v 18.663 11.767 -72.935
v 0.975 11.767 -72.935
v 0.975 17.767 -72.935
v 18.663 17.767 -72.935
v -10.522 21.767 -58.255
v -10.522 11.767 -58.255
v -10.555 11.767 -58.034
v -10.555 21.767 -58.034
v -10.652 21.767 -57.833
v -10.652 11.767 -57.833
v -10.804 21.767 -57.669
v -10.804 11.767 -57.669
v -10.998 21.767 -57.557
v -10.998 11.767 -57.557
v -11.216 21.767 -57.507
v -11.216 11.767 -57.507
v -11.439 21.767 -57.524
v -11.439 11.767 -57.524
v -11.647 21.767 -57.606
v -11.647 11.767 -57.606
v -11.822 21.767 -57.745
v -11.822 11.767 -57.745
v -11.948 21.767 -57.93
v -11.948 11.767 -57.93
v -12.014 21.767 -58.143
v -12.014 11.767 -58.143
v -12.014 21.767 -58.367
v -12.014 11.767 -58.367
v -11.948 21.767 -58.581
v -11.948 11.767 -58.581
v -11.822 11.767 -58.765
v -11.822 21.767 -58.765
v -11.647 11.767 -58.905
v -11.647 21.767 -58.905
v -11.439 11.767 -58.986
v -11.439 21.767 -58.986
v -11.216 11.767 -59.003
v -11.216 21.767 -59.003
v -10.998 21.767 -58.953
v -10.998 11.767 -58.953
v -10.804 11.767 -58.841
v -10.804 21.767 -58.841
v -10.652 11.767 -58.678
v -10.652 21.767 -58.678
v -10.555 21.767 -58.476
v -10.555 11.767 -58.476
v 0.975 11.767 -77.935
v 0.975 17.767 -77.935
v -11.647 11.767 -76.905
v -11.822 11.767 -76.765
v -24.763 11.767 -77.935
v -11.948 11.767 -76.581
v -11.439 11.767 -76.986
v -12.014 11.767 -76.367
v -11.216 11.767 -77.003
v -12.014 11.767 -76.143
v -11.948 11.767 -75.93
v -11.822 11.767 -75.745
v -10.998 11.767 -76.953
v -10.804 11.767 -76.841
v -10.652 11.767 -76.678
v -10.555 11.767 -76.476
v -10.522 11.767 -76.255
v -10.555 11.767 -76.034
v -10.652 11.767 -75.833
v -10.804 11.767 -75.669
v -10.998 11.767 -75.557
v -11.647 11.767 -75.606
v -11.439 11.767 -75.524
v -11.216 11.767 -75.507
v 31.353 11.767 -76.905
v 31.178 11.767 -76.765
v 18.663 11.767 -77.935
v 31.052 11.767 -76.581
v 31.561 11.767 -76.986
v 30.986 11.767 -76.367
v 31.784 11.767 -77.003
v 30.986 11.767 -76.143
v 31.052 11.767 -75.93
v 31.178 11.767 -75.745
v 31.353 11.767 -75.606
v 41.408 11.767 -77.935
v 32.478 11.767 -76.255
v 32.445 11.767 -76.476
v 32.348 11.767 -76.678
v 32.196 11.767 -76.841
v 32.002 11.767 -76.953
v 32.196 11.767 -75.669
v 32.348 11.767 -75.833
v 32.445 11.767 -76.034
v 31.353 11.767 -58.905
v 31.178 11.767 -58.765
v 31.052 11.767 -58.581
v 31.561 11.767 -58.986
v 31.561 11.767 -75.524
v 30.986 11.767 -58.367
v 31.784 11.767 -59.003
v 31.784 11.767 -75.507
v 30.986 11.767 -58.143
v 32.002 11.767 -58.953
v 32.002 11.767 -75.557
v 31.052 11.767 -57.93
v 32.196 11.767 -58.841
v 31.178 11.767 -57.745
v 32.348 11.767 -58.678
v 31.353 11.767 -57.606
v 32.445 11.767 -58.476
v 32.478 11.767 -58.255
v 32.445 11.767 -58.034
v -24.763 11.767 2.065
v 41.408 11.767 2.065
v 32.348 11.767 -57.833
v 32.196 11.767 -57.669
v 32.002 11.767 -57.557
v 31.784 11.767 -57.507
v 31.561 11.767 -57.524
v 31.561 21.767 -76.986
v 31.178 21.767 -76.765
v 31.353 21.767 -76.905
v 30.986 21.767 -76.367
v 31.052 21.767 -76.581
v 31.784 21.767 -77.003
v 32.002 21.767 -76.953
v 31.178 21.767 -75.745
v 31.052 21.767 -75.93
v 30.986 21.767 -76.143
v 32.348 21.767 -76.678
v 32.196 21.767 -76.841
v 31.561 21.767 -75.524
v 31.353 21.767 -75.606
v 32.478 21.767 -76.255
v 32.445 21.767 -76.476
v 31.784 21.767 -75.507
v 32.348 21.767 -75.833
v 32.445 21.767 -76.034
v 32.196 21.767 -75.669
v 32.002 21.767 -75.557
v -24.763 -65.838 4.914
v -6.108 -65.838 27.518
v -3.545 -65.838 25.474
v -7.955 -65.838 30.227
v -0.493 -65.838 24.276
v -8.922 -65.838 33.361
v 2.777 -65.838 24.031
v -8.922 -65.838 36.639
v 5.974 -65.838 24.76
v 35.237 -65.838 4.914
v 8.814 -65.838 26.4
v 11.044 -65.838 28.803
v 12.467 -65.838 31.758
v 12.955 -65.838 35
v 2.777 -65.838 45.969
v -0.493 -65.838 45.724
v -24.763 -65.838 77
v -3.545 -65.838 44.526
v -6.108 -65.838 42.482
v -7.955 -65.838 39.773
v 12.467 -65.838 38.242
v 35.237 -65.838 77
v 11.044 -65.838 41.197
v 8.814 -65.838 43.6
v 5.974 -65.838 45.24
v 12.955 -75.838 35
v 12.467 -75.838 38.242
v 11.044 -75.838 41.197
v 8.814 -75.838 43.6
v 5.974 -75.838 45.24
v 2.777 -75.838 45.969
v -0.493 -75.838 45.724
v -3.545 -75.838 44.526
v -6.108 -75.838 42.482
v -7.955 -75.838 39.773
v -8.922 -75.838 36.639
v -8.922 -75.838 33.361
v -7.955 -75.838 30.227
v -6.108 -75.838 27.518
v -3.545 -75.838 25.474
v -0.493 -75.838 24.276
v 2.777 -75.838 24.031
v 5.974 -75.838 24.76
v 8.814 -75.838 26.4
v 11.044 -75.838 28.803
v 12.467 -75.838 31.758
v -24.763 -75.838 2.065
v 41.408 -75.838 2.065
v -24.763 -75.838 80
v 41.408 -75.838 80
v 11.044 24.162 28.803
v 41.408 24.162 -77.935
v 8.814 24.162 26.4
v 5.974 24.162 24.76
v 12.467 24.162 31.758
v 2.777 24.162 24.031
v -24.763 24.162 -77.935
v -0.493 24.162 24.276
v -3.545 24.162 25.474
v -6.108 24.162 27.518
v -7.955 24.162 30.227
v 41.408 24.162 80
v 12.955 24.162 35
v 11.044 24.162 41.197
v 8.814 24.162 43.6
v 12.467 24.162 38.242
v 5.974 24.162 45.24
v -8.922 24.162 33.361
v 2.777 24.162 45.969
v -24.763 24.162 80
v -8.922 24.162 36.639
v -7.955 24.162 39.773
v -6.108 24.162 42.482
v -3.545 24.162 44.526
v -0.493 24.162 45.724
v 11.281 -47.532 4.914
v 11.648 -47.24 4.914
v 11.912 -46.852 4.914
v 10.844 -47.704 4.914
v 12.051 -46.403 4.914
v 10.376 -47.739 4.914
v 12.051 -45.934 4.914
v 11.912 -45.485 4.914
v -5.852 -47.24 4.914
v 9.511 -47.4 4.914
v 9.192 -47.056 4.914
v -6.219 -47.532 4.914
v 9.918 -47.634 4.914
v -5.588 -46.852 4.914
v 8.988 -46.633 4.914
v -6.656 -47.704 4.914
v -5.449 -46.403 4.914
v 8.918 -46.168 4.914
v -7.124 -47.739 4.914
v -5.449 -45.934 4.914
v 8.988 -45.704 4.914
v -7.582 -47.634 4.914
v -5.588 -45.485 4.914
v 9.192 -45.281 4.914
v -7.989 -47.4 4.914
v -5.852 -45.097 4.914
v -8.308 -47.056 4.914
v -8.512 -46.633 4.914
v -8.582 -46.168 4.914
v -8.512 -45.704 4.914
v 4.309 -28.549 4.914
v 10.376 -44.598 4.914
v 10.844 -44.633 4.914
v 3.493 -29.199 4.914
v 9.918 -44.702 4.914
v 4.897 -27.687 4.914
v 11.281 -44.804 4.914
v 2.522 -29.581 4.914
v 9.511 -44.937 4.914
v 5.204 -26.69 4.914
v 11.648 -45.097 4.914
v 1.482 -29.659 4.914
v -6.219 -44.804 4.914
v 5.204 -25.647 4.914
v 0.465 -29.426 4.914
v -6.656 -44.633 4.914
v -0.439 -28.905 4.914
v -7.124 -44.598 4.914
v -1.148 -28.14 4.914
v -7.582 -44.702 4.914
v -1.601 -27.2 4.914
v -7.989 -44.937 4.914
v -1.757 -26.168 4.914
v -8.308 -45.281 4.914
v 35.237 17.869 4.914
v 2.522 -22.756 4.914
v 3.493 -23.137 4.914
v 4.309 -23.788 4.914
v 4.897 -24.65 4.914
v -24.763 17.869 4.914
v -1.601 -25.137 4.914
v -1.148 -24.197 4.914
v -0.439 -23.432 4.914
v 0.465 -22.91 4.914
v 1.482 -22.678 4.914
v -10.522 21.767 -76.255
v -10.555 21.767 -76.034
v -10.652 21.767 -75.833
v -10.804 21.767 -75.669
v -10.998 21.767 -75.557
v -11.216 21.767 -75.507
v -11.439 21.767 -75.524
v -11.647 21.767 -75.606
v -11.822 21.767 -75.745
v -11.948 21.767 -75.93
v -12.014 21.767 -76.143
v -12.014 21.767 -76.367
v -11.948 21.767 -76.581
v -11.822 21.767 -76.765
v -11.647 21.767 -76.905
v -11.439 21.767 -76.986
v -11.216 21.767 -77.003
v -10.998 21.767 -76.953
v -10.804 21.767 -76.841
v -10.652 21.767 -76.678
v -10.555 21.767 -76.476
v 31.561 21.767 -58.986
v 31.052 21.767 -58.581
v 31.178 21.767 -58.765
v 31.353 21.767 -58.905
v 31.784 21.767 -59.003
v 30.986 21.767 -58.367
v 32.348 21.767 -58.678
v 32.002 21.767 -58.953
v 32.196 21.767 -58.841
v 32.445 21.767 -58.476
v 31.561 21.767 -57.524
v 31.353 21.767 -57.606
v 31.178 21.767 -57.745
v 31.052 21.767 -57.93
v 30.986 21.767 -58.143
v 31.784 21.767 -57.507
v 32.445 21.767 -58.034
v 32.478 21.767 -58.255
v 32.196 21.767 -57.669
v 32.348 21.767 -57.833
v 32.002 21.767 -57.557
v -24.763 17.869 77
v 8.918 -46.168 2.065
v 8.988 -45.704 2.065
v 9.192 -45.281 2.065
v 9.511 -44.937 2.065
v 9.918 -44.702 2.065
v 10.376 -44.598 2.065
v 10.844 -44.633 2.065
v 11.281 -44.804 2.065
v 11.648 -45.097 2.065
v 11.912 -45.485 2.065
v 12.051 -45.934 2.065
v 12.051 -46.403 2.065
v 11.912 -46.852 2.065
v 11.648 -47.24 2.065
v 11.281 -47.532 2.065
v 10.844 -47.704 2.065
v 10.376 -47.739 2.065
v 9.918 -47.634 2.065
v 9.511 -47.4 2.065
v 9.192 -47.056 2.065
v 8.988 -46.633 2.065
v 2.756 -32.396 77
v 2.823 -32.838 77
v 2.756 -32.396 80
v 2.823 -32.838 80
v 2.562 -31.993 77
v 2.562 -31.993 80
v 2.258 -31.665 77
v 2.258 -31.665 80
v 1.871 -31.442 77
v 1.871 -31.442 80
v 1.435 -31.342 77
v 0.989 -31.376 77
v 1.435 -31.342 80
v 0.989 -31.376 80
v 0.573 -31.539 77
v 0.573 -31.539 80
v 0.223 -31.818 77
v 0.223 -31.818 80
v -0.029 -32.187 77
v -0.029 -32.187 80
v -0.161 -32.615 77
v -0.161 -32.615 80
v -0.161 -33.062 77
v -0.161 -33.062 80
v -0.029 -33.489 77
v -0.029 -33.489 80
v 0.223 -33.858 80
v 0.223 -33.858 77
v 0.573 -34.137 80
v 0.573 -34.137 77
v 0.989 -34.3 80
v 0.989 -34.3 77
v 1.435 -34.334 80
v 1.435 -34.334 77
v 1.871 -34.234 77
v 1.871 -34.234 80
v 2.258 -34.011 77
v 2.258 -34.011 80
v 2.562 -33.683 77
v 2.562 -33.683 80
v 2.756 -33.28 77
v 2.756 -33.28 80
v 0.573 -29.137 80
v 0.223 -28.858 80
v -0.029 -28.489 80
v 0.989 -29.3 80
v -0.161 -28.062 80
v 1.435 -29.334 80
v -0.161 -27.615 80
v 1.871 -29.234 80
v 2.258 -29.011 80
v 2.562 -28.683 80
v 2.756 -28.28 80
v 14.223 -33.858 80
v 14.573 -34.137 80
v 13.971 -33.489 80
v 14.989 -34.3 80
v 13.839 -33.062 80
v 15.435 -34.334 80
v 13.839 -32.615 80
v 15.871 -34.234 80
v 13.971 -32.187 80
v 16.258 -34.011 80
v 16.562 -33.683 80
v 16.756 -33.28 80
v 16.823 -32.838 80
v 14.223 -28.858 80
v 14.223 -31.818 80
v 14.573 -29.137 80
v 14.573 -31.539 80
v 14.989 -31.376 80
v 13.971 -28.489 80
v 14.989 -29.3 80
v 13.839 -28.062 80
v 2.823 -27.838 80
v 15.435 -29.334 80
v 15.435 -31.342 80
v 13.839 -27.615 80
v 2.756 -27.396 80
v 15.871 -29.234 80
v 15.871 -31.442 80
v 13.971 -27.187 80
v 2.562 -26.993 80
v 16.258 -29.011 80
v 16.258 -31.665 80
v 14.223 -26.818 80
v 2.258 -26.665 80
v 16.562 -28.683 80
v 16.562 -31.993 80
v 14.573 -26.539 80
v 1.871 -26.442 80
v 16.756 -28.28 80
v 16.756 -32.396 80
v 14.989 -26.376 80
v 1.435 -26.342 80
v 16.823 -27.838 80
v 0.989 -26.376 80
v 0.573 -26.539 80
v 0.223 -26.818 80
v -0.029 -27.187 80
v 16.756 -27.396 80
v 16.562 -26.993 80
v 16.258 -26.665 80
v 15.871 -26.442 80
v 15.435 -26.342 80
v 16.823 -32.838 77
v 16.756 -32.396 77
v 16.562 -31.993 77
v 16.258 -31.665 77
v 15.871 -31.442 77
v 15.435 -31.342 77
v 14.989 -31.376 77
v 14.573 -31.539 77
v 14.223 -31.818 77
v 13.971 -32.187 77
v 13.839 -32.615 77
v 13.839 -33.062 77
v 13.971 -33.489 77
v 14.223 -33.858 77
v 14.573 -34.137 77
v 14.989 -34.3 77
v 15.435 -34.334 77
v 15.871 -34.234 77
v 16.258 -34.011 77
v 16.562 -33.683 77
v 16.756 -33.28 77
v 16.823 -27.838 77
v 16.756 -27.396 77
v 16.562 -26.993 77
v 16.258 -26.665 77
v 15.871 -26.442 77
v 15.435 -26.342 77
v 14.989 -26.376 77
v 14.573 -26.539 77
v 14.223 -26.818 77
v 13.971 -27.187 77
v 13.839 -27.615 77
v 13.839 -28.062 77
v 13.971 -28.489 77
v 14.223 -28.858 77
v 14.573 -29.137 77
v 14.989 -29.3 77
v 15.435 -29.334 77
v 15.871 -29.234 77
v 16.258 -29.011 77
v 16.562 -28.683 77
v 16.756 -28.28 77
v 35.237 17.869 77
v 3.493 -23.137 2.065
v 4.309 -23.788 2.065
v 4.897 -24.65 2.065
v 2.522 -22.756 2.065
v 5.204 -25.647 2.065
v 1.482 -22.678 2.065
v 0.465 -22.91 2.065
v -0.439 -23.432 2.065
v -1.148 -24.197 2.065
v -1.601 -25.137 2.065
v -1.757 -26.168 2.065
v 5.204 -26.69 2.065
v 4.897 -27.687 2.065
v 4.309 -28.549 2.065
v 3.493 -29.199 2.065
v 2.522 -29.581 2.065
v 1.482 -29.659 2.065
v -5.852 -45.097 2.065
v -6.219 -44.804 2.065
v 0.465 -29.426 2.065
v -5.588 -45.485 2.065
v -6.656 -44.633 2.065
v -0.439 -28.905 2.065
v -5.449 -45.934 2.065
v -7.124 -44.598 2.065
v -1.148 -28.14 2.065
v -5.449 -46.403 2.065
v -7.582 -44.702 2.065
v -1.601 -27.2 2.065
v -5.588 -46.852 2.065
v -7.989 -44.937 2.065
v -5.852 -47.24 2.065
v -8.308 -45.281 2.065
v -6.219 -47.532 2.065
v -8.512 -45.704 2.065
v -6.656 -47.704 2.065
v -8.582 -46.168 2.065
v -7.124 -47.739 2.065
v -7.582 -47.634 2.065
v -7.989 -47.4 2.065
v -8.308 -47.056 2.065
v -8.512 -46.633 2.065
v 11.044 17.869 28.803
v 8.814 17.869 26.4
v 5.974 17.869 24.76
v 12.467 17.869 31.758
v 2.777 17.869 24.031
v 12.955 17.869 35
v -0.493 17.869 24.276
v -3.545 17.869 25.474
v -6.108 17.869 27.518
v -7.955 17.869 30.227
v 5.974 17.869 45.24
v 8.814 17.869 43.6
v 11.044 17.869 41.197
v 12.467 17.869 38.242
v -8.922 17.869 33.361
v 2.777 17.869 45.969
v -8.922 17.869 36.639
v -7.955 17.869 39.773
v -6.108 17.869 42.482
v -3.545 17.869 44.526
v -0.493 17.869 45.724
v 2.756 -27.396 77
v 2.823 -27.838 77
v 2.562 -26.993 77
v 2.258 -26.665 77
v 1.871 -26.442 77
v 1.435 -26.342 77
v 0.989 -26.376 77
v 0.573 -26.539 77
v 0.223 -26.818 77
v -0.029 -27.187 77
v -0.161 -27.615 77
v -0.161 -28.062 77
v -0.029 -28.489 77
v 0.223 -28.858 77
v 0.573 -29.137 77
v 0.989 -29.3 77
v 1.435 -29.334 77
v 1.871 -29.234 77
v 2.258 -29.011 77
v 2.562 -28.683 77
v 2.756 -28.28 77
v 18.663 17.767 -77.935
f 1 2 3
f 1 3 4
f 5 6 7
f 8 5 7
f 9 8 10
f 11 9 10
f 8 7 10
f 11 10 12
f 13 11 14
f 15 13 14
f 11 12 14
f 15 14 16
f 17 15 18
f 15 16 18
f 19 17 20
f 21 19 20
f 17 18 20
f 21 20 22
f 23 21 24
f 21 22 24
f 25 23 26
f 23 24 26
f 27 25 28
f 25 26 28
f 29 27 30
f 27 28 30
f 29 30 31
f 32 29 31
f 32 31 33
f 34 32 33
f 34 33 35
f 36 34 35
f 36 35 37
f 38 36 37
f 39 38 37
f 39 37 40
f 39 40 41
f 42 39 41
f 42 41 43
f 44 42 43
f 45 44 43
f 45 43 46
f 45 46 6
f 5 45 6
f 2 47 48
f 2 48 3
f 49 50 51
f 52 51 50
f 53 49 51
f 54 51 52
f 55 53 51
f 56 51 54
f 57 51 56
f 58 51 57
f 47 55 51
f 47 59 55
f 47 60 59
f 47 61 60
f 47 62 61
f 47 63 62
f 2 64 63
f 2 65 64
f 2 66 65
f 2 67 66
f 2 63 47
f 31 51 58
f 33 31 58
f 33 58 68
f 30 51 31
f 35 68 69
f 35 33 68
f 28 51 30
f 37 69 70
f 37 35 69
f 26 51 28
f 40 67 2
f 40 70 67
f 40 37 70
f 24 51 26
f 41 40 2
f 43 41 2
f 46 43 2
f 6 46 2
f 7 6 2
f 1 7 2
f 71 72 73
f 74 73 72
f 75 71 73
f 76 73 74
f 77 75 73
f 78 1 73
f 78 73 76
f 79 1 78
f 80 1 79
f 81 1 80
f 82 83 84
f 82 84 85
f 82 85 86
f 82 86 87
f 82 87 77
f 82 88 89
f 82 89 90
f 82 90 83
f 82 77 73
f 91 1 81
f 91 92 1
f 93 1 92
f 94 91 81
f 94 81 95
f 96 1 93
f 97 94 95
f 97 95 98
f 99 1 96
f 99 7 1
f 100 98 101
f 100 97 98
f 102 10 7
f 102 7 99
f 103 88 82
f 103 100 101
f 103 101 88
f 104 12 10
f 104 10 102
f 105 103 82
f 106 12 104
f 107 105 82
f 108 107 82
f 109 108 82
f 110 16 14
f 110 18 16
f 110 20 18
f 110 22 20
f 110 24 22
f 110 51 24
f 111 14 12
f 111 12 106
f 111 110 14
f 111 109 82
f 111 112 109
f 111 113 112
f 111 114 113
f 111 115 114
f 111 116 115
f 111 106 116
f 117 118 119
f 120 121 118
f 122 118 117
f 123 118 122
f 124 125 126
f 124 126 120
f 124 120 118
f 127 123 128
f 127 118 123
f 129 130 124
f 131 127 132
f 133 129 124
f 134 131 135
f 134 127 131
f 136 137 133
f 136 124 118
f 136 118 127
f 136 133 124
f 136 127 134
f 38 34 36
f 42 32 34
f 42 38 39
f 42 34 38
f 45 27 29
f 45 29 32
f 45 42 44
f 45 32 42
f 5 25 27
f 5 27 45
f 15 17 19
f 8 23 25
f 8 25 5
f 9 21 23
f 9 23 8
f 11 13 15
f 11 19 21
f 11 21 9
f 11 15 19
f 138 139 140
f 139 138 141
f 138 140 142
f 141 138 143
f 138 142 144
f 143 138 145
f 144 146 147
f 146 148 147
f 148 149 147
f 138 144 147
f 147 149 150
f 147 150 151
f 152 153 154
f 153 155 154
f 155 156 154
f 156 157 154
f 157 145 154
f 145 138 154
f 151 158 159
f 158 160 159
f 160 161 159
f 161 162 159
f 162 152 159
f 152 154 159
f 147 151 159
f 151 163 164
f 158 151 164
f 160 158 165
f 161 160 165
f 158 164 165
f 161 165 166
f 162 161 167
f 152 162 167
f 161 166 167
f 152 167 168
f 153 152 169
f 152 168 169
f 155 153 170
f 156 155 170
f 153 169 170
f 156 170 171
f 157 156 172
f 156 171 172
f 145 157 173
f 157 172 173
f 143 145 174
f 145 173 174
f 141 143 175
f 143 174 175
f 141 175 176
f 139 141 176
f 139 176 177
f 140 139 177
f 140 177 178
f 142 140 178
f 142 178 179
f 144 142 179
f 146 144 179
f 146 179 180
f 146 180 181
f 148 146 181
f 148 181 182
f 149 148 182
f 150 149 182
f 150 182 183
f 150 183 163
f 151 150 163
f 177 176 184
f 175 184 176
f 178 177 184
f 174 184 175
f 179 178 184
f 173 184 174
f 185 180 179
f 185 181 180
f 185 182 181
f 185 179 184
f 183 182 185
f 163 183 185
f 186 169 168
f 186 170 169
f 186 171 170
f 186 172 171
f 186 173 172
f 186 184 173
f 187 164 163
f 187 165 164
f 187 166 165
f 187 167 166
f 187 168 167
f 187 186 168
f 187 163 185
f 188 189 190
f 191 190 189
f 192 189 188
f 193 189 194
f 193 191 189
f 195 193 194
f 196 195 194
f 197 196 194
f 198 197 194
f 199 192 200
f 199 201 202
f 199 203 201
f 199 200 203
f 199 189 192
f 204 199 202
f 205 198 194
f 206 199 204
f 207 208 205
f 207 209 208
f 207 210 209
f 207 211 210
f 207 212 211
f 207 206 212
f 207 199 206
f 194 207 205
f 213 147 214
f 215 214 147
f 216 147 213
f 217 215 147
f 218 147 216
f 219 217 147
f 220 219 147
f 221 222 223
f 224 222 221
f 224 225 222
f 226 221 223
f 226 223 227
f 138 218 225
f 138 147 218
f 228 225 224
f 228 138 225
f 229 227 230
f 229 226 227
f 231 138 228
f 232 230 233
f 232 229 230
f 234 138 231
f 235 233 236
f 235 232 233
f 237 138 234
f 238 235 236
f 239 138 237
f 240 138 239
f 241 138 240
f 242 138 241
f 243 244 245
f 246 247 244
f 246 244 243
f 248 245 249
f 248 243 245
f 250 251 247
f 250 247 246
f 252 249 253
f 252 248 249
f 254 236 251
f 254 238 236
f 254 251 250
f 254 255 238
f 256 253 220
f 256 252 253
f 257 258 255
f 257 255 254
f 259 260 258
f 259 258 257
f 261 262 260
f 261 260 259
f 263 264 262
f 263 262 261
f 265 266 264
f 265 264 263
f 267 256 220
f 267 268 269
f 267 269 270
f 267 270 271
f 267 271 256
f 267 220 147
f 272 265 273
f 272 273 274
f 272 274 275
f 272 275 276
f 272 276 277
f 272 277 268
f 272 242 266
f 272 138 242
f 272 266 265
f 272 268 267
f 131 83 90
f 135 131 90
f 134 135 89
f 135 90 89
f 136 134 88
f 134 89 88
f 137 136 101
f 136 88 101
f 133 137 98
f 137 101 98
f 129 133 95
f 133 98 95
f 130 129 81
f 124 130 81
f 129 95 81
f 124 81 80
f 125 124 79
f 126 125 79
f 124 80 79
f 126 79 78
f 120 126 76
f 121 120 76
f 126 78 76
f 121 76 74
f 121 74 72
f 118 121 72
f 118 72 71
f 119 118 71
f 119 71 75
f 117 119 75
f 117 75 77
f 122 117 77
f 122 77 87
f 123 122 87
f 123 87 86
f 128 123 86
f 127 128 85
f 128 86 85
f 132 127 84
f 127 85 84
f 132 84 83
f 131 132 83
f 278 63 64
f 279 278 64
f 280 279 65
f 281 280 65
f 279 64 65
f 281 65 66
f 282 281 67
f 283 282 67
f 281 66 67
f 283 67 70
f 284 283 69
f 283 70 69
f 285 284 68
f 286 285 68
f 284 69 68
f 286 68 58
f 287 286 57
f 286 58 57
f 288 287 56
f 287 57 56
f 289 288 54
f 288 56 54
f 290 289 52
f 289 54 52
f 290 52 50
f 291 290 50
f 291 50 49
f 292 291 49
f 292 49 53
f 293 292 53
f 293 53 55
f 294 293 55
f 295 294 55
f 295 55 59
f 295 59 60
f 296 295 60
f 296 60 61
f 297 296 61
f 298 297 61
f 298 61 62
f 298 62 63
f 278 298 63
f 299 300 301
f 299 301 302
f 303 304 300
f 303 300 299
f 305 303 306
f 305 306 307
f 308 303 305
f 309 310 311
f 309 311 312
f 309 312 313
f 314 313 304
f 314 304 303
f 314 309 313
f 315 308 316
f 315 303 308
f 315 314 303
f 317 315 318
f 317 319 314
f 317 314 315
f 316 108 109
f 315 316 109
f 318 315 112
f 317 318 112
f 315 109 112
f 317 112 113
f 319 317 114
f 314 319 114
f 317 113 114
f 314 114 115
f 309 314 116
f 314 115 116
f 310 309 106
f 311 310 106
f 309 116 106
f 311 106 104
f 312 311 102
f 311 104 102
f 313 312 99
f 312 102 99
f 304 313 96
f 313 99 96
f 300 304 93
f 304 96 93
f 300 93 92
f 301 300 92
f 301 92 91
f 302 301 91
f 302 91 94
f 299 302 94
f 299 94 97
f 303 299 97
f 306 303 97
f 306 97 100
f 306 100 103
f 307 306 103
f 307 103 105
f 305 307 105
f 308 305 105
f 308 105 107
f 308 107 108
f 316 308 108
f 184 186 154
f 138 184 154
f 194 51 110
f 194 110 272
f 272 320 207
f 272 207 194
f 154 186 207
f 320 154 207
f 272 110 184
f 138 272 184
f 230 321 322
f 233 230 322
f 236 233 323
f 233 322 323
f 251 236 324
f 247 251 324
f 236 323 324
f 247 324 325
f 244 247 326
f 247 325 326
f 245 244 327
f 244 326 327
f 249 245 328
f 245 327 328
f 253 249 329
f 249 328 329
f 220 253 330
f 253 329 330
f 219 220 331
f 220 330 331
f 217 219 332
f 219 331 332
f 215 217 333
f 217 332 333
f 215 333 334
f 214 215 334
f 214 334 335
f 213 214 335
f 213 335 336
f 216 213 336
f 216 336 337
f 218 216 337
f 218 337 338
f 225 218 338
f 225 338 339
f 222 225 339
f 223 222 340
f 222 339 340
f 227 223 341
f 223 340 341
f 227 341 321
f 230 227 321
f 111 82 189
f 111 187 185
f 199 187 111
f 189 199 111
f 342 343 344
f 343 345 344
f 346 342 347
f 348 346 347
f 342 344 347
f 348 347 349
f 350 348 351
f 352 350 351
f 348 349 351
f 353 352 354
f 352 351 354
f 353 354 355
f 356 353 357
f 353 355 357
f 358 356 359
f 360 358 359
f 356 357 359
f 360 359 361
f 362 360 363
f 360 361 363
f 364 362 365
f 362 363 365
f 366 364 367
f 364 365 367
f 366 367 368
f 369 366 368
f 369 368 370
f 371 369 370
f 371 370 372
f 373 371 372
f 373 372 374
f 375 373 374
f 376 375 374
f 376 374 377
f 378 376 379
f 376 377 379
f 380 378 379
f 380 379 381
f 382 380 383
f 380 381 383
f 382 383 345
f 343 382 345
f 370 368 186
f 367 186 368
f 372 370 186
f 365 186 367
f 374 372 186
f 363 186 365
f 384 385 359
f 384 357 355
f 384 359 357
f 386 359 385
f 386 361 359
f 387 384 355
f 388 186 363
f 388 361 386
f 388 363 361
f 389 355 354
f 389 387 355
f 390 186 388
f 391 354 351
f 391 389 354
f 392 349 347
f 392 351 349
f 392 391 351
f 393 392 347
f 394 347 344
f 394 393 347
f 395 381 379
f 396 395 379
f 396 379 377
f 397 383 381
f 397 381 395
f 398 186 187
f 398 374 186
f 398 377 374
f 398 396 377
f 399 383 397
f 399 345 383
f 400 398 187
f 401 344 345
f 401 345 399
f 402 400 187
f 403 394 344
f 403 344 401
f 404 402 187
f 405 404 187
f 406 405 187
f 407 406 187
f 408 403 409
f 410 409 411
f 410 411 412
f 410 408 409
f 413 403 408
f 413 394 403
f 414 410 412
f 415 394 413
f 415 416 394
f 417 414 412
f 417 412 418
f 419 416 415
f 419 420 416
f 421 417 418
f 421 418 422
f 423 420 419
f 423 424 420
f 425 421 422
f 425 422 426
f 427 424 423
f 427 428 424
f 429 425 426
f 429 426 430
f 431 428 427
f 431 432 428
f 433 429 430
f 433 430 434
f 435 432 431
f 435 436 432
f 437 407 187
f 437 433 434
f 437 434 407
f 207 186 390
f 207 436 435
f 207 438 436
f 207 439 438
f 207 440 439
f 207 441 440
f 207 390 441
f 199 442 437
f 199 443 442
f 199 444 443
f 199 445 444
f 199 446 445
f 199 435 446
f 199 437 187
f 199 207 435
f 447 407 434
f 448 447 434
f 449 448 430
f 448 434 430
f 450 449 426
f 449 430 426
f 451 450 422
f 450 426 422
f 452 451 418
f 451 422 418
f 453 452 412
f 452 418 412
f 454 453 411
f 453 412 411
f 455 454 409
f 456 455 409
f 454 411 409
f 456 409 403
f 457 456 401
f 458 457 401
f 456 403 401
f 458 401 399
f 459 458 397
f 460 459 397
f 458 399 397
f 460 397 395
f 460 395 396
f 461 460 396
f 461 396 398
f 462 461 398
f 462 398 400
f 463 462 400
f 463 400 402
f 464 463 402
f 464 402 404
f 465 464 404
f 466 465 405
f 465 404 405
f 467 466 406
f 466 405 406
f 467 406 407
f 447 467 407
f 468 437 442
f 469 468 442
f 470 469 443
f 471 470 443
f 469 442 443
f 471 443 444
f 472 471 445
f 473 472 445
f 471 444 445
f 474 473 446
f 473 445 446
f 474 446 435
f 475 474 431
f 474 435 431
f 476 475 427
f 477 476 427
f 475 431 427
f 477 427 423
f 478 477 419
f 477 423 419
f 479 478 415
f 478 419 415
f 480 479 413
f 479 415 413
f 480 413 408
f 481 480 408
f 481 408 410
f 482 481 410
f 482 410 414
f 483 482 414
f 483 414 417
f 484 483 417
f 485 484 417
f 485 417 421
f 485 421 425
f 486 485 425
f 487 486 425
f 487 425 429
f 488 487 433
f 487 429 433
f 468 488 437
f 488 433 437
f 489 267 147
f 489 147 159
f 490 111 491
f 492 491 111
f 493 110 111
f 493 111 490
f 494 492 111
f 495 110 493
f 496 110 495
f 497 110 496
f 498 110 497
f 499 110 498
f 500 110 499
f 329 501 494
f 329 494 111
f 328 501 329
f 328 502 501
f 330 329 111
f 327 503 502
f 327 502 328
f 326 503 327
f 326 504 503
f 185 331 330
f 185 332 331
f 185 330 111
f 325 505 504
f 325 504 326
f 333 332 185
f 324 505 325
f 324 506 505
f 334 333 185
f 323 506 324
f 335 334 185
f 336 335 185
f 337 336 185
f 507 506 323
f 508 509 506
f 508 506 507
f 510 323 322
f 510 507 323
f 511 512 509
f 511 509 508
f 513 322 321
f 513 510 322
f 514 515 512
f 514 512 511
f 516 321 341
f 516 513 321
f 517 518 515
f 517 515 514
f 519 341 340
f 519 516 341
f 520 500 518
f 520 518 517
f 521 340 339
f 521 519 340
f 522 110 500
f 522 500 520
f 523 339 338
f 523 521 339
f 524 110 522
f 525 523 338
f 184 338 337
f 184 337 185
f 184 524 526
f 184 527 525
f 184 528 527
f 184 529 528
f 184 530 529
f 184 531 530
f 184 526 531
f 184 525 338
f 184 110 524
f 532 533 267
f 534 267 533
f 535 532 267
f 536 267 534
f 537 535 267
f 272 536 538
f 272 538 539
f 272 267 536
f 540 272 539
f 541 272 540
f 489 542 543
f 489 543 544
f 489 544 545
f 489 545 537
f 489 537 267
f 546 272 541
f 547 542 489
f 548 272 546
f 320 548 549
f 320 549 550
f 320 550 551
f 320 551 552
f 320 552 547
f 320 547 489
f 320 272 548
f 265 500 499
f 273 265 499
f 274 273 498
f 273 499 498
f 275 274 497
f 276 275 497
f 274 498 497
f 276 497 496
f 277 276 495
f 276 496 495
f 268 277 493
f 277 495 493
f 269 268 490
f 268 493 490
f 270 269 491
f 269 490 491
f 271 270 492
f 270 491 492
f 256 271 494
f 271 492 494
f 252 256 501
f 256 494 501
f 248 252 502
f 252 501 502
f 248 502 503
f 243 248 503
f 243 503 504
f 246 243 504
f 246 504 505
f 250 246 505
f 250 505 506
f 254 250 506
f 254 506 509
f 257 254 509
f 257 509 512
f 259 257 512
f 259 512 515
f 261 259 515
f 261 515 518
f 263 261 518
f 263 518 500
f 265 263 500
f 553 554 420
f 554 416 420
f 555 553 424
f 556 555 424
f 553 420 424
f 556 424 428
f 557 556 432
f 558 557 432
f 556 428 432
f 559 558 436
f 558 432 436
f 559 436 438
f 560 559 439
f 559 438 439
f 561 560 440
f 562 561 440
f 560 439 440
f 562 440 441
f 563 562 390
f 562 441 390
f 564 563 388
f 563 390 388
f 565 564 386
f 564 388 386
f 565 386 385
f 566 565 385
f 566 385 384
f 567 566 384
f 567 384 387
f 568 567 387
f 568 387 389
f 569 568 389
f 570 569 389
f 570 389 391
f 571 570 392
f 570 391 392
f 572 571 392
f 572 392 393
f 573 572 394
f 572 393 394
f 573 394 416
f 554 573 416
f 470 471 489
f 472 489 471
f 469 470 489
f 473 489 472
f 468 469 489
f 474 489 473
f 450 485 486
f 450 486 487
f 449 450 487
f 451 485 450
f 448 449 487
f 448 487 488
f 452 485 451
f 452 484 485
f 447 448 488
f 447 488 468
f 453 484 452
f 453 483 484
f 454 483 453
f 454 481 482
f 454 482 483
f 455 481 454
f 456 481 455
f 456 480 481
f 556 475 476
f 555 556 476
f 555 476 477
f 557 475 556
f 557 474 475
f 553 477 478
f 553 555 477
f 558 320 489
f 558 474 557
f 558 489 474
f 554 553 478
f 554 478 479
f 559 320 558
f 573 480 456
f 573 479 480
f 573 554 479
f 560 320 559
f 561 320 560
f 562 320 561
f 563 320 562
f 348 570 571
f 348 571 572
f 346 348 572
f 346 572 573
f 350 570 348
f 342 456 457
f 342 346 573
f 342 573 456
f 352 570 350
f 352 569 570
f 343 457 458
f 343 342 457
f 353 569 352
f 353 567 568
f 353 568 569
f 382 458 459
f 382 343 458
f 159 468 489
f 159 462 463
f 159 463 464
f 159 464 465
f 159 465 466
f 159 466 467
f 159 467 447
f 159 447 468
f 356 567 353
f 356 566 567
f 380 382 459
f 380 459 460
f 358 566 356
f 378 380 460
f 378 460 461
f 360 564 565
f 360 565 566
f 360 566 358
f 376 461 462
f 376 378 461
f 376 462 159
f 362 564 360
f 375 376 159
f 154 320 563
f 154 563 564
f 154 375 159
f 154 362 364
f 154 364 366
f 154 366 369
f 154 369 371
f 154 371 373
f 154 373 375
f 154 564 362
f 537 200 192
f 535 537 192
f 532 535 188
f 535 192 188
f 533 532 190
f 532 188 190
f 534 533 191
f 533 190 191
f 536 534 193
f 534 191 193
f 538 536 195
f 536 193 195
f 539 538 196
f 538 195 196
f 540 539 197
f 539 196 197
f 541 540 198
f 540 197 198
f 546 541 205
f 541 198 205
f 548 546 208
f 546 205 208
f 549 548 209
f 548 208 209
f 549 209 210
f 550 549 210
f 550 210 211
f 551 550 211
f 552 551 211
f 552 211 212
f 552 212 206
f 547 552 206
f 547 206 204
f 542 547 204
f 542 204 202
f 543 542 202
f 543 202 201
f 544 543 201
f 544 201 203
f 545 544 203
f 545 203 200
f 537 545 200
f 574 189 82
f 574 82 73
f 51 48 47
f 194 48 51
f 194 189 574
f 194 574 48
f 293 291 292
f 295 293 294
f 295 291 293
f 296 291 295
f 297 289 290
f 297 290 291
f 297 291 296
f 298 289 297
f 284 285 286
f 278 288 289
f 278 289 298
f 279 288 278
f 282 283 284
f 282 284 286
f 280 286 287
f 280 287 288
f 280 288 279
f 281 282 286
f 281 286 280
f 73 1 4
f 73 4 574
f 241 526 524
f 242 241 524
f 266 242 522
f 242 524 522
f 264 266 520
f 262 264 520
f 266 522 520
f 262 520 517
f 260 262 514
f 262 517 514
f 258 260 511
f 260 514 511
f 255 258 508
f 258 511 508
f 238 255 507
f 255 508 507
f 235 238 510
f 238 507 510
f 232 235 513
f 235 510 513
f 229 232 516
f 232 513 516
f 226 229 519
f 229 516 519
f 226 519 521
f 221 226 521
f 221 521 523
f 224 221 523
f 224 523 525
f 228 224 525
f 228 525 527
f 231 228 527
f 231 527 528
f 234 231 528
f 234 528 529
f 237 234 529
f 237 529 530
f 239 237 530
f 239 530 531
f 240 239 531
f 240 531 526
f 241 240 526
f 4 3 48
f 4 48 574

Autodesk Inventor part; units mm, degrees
ref_plane "YZ Plane" through (0, 0, 0) normal (1, 0, 0) x (0, 1, 0)
ref_plane "XZ Plane" through (0, 0, 0) normal (0, 1, 0) x (-1, 0, 0)
ref_plane "XY Plane" through (0, 0, 0) normal (0, 0, 1) x (1, 0, 0)
sketch "Sketch1" plane through (0, 0, 0) normal (0, 0, 1) x (1, 0, 0)
  line L0 (-24.7628, 24.1619) -> (95.2372, 24.1619)
  line L1 (95.2372, 24.1619) -> (95.2372, -75.8381)
  line L2 (95.2372, -75.8381) -> (-24.7628, -75.8381)
  line L3 (-24.7628, -75.8381) -> (-24.7628, 24.1619)
  point P0 (0, 0)
  dimension "d0" = 120
  dimension "d1" = 100
extrude "Extrusion1" add sketch "Sketch1" along normal blind 80
sketch "Sketch2" plane through (-24.7628, -75.8381, 0) normal (-1, 0, 0) x (0, 0, 1)
  line L0 (0, 0) -> (80, 0) projected
  line L1 (4.914, 93.7072) -> (77, 93.7072)
  line L2 (77, 93.7072) -> (77, 0)
  line L3 (77, 0) -> (4.914, 0)
  line L4 (4.914, 0) -> (4.914, 93.7072)
  line L5 (80, 100) -> (80, 0) projected
  line L6 (0, 100) -> (0, 0) projected
  point P0 (0, 75.8381)
  point P1 (4.914, 0)
  dimension "d6" = 3
  dimension "d108" = 4.914
extrude "Extrusion2" cut sketch "Sketch2" against normal blind 60
sketch "Sketch3" plane through (-24.7628, 24.1619, 0) normal (0, 1, 0) x (1, 0, 0)
  line L0 (0, 0) -> (0, -4.914) projected
  line L1 (0, 0) -> (0, -31.38)
  circle A0 centre (26.718, -35) radius 11
  line L2 (120, 0) -> (0, 0) projected
  point P0 (24.7628, 0)
  dimension "d7" = 31.38
  dimension "d9" = 22
  dimension "d109" = 35
extrude "Extrusion3" cut sketch "Sketch3" against normal blind 80
sketch "Sketch8" plane through (0, 0, 0) normal (0, 0, -1) x (-1, 0, 0)
  line L0 (-95.2372, 24.1619) -> (24.7628, 24.1619) projected
  line L1 (-1.9784, 24.1619) -> (-38.1484, 24.1619)
  circle A0 centre (-1.7434, -26.1683) radius 3.5
  circle A1 centre (-10.4934, -46.1683) radius 1.575
  circle A2 centre (7.0066, -46.1683) radius 1.575
  line L2 (7.0066, -46.1683) -> (-10.4934, -46.1683)
  line L3 (-1.7434, -26.1683) -> (-1.7434, -46.1683)
  point P0 (0, 0)
  point P1 (-4.8068, -28.0128)
  dimension "d26" = 36.17
  dimension "d143" = 3.15
  dimension "d144" = 3.15
  dimension "d145" = 20
sketch "Sketch9" plane through (0, 0, 80) normal (0, 0, 1) x (1, 0, 0)
  line L0 (95.2372, 24.1619) -> (-24.7628, 24.1619) projected
  line L1 (41.408, 24.1619) -> (95.2372, 24.1619)
  line L2 (95.2372, 24.1619) -> (95.2372, -75.6591)
  line L3 (95.2372, -75.6591) -> (41.408, -75.6591)
  line L4 (41.408, -75.6591) -> (41.408, 24.1619)
  point P0 (0, 0)
extrude "Extrusion8" cut sketch "Sketch9" against normal blind 82.75
sketch "Sketch11" plane through (41.408, -75.6591, 80) normal (0, 1, 0) x (1, 0, 0)
  line L0 (0, 0) -> (-66.1708, 0) projected
  line L1 (-66.1708, 80) -> (53.8292, 80) projected
  line L2 (0, 0) -> (53.8292, 0)
  line L3 (53.8292, 0) -> (53.8292, 80)
  line L4 (53.8292, 80) -> (0, 80)
  line L5 (0, 80) -> (0, 0)
  point P0 (-41.408, 80)
extrude "Extrusion9" cut sketch "Sketch11" against normal blind 82.75
sketch "Sketch16" plane through (-24.7628, -75.8381, 77) normal (0, -1, 0) x (1, 0, 0)
  line L0 (0, -72.086) -> (0, 0) projected
  line L1 (0, 0) -> (60, 0) projected
  line L2 (0, -72.086) -> (60, -72.086)
  line L3 (60, -72.086) -> (60, 0)
  line L4 (60, 0) -> (0, 0)
  line L5 (0, 0) -> (0, -72.086)
  circle A0 centre (26.718, -42) radius 11 projected
  circle A1 centre (26.718, -42) radius 5
  point P0 (24.7628, -77)
extrude "Extrusion14" add sketch "Sketch16" against normal blind 10 contours L0 L1 L3 L2
ref_plane "Work Plane1" through (-34.7628, -75.8381, 80) normal (-1, 0, 0) x (0, 0, 1)
sketch "Sketch24" plane through (-34.7628, -75.8381, 80) normal (-1, 0, 0) x (0, 0, 1)
  line L0 (-131.9676, 100) -> (-77.9351, 100)
  line L1 (-77.9351, 100) -> (-77.9351, -1.253)
  line L2 (-77.9351, -1.253) -> (-131.9676, -1.253)
  line L3 (-131.9676, -1.253) -> (-131.9676, 100)
  point P0 (-80, 75.8381)
extrude "Extrusion19" cut sketch "Sketch24" against normal blind 103.25
sketch "Sketch27" plane through (0, 0, 80) normal (0, 0, 1) x (1, 0, 0)
  line L0 (-24.7628, -75.8381) -> (41.408, -75.8381) projected
  circle A0 centre (15.3226, -32.8381) radius 1.5
  line L1 (15.3226, -32.8381) -> (1.3226, -32.8381)
  line L2 (15.3226, -35.3779) -> (15.3226, -32.8381)
  circle A1 centre (15.3226, -27.8381) radius 1.5
  circle A2 centre (1.3226, -32.8381) radius 1.5
  circle A3 centre (1.3226, -27.8381) radius 1.5
  line L3 (41.408, 24.1619) -> (-24.7628, 24.1619) projected
  point P0 (0, 0)
  dimension "d125" = 5
  dimension "d128" = 14
  dimension "d169" = 52
extrude "Extrusion22" cut sketch "Sketch27" against normal blind 20
extrude "Extrusion24" cut sketch "Sketch8" against normal blind 10
sketch "Sketch28" plane through (41.408, 24.1619, 2.0649) normal (0, 0, -1) x (-1, 0, 0)
  line L0 (0, -100) -> (0, 0) projected
  line L1 (66.1708, -90) -> (66.1708, -6.2928) projected
  line L2 (0, 0) -> (66.1708, 0)
  line L3 (66.1708, 0) -> (66.1708, -12.3951)
  line L4 (66.1708, -12.3951) -> (0, -12.3951)
  line L5 (0, -12.3951) -> (0, 0)
  point P0 (41.408, -24.1619)
  point P1 (0, -12.3951)
extrude "Extrusion25" add sketch "Sketch28" along normal blind 80
sketch "Sketch29" plane through (-24.7628, 11.7668, 2.0649) normal (0, -1, 0) x (1, 0, 0)
  line L0 (66.1708, -80) -> (0, -80) projected
  line L1 (66.1708, -80) -> (66.1708, -78.32)
  line L2 (66.1708, 0) -> (66.1708, -80) projected
  circle A0 centre (56.4908, -78.32) radius 0.75
  line L3 (56.4908, -78.32) -> (13.4908, -78.32)
  line L4 (56.4908, -61.93) -> (56.4908, -78.32)
  circle A1 centre (13.4908, -78.32) radius 0.75
  circle A2 centre (56.4908, -60.32) radius 0.75
  circle A3 centre (13.4908, -60.32) radius 0.75
  point P0 (24.7628, -2.0649)
  dimension "d150" = 1.5
  dimension "d155" = 43
  dimension "d158" = 18
  dimension "d163" = 18
extrude "Extrusion26" cut sketch "Sketch29" against normal blind 10
sketch "Sketch30" plane through (-24.7628, 11.7668, 2.0649) normal (0, -1, 0) x (1, 0, 0)
  circle A0 centre (56.4908, -78.32) radius 0.75 projected
  line L0 (0, -80) -> (66.1708, -80) projected
  line L1 (43.4258, -80) -> (25.7382, -80)
  line L2 (25.7382, -80) -> (25.7382, -75)
  line L3 (25.7382, -75) -> (43.4258, -75)
  line L4 (43.4258, -75) -> (43.4258, -80)
  point P0 (24.7628, -2.0649)
  point P1 (25.7382, -80)
  point P2 (43.4258, -80)
  dimension "d165" = 5
  dimension "d168" = 13.065
extrude "Extrusion27" cut sketch "Sketch30" against normal blind 6 contours L2 L3 L4 L0
properties part number "Gearbox"
